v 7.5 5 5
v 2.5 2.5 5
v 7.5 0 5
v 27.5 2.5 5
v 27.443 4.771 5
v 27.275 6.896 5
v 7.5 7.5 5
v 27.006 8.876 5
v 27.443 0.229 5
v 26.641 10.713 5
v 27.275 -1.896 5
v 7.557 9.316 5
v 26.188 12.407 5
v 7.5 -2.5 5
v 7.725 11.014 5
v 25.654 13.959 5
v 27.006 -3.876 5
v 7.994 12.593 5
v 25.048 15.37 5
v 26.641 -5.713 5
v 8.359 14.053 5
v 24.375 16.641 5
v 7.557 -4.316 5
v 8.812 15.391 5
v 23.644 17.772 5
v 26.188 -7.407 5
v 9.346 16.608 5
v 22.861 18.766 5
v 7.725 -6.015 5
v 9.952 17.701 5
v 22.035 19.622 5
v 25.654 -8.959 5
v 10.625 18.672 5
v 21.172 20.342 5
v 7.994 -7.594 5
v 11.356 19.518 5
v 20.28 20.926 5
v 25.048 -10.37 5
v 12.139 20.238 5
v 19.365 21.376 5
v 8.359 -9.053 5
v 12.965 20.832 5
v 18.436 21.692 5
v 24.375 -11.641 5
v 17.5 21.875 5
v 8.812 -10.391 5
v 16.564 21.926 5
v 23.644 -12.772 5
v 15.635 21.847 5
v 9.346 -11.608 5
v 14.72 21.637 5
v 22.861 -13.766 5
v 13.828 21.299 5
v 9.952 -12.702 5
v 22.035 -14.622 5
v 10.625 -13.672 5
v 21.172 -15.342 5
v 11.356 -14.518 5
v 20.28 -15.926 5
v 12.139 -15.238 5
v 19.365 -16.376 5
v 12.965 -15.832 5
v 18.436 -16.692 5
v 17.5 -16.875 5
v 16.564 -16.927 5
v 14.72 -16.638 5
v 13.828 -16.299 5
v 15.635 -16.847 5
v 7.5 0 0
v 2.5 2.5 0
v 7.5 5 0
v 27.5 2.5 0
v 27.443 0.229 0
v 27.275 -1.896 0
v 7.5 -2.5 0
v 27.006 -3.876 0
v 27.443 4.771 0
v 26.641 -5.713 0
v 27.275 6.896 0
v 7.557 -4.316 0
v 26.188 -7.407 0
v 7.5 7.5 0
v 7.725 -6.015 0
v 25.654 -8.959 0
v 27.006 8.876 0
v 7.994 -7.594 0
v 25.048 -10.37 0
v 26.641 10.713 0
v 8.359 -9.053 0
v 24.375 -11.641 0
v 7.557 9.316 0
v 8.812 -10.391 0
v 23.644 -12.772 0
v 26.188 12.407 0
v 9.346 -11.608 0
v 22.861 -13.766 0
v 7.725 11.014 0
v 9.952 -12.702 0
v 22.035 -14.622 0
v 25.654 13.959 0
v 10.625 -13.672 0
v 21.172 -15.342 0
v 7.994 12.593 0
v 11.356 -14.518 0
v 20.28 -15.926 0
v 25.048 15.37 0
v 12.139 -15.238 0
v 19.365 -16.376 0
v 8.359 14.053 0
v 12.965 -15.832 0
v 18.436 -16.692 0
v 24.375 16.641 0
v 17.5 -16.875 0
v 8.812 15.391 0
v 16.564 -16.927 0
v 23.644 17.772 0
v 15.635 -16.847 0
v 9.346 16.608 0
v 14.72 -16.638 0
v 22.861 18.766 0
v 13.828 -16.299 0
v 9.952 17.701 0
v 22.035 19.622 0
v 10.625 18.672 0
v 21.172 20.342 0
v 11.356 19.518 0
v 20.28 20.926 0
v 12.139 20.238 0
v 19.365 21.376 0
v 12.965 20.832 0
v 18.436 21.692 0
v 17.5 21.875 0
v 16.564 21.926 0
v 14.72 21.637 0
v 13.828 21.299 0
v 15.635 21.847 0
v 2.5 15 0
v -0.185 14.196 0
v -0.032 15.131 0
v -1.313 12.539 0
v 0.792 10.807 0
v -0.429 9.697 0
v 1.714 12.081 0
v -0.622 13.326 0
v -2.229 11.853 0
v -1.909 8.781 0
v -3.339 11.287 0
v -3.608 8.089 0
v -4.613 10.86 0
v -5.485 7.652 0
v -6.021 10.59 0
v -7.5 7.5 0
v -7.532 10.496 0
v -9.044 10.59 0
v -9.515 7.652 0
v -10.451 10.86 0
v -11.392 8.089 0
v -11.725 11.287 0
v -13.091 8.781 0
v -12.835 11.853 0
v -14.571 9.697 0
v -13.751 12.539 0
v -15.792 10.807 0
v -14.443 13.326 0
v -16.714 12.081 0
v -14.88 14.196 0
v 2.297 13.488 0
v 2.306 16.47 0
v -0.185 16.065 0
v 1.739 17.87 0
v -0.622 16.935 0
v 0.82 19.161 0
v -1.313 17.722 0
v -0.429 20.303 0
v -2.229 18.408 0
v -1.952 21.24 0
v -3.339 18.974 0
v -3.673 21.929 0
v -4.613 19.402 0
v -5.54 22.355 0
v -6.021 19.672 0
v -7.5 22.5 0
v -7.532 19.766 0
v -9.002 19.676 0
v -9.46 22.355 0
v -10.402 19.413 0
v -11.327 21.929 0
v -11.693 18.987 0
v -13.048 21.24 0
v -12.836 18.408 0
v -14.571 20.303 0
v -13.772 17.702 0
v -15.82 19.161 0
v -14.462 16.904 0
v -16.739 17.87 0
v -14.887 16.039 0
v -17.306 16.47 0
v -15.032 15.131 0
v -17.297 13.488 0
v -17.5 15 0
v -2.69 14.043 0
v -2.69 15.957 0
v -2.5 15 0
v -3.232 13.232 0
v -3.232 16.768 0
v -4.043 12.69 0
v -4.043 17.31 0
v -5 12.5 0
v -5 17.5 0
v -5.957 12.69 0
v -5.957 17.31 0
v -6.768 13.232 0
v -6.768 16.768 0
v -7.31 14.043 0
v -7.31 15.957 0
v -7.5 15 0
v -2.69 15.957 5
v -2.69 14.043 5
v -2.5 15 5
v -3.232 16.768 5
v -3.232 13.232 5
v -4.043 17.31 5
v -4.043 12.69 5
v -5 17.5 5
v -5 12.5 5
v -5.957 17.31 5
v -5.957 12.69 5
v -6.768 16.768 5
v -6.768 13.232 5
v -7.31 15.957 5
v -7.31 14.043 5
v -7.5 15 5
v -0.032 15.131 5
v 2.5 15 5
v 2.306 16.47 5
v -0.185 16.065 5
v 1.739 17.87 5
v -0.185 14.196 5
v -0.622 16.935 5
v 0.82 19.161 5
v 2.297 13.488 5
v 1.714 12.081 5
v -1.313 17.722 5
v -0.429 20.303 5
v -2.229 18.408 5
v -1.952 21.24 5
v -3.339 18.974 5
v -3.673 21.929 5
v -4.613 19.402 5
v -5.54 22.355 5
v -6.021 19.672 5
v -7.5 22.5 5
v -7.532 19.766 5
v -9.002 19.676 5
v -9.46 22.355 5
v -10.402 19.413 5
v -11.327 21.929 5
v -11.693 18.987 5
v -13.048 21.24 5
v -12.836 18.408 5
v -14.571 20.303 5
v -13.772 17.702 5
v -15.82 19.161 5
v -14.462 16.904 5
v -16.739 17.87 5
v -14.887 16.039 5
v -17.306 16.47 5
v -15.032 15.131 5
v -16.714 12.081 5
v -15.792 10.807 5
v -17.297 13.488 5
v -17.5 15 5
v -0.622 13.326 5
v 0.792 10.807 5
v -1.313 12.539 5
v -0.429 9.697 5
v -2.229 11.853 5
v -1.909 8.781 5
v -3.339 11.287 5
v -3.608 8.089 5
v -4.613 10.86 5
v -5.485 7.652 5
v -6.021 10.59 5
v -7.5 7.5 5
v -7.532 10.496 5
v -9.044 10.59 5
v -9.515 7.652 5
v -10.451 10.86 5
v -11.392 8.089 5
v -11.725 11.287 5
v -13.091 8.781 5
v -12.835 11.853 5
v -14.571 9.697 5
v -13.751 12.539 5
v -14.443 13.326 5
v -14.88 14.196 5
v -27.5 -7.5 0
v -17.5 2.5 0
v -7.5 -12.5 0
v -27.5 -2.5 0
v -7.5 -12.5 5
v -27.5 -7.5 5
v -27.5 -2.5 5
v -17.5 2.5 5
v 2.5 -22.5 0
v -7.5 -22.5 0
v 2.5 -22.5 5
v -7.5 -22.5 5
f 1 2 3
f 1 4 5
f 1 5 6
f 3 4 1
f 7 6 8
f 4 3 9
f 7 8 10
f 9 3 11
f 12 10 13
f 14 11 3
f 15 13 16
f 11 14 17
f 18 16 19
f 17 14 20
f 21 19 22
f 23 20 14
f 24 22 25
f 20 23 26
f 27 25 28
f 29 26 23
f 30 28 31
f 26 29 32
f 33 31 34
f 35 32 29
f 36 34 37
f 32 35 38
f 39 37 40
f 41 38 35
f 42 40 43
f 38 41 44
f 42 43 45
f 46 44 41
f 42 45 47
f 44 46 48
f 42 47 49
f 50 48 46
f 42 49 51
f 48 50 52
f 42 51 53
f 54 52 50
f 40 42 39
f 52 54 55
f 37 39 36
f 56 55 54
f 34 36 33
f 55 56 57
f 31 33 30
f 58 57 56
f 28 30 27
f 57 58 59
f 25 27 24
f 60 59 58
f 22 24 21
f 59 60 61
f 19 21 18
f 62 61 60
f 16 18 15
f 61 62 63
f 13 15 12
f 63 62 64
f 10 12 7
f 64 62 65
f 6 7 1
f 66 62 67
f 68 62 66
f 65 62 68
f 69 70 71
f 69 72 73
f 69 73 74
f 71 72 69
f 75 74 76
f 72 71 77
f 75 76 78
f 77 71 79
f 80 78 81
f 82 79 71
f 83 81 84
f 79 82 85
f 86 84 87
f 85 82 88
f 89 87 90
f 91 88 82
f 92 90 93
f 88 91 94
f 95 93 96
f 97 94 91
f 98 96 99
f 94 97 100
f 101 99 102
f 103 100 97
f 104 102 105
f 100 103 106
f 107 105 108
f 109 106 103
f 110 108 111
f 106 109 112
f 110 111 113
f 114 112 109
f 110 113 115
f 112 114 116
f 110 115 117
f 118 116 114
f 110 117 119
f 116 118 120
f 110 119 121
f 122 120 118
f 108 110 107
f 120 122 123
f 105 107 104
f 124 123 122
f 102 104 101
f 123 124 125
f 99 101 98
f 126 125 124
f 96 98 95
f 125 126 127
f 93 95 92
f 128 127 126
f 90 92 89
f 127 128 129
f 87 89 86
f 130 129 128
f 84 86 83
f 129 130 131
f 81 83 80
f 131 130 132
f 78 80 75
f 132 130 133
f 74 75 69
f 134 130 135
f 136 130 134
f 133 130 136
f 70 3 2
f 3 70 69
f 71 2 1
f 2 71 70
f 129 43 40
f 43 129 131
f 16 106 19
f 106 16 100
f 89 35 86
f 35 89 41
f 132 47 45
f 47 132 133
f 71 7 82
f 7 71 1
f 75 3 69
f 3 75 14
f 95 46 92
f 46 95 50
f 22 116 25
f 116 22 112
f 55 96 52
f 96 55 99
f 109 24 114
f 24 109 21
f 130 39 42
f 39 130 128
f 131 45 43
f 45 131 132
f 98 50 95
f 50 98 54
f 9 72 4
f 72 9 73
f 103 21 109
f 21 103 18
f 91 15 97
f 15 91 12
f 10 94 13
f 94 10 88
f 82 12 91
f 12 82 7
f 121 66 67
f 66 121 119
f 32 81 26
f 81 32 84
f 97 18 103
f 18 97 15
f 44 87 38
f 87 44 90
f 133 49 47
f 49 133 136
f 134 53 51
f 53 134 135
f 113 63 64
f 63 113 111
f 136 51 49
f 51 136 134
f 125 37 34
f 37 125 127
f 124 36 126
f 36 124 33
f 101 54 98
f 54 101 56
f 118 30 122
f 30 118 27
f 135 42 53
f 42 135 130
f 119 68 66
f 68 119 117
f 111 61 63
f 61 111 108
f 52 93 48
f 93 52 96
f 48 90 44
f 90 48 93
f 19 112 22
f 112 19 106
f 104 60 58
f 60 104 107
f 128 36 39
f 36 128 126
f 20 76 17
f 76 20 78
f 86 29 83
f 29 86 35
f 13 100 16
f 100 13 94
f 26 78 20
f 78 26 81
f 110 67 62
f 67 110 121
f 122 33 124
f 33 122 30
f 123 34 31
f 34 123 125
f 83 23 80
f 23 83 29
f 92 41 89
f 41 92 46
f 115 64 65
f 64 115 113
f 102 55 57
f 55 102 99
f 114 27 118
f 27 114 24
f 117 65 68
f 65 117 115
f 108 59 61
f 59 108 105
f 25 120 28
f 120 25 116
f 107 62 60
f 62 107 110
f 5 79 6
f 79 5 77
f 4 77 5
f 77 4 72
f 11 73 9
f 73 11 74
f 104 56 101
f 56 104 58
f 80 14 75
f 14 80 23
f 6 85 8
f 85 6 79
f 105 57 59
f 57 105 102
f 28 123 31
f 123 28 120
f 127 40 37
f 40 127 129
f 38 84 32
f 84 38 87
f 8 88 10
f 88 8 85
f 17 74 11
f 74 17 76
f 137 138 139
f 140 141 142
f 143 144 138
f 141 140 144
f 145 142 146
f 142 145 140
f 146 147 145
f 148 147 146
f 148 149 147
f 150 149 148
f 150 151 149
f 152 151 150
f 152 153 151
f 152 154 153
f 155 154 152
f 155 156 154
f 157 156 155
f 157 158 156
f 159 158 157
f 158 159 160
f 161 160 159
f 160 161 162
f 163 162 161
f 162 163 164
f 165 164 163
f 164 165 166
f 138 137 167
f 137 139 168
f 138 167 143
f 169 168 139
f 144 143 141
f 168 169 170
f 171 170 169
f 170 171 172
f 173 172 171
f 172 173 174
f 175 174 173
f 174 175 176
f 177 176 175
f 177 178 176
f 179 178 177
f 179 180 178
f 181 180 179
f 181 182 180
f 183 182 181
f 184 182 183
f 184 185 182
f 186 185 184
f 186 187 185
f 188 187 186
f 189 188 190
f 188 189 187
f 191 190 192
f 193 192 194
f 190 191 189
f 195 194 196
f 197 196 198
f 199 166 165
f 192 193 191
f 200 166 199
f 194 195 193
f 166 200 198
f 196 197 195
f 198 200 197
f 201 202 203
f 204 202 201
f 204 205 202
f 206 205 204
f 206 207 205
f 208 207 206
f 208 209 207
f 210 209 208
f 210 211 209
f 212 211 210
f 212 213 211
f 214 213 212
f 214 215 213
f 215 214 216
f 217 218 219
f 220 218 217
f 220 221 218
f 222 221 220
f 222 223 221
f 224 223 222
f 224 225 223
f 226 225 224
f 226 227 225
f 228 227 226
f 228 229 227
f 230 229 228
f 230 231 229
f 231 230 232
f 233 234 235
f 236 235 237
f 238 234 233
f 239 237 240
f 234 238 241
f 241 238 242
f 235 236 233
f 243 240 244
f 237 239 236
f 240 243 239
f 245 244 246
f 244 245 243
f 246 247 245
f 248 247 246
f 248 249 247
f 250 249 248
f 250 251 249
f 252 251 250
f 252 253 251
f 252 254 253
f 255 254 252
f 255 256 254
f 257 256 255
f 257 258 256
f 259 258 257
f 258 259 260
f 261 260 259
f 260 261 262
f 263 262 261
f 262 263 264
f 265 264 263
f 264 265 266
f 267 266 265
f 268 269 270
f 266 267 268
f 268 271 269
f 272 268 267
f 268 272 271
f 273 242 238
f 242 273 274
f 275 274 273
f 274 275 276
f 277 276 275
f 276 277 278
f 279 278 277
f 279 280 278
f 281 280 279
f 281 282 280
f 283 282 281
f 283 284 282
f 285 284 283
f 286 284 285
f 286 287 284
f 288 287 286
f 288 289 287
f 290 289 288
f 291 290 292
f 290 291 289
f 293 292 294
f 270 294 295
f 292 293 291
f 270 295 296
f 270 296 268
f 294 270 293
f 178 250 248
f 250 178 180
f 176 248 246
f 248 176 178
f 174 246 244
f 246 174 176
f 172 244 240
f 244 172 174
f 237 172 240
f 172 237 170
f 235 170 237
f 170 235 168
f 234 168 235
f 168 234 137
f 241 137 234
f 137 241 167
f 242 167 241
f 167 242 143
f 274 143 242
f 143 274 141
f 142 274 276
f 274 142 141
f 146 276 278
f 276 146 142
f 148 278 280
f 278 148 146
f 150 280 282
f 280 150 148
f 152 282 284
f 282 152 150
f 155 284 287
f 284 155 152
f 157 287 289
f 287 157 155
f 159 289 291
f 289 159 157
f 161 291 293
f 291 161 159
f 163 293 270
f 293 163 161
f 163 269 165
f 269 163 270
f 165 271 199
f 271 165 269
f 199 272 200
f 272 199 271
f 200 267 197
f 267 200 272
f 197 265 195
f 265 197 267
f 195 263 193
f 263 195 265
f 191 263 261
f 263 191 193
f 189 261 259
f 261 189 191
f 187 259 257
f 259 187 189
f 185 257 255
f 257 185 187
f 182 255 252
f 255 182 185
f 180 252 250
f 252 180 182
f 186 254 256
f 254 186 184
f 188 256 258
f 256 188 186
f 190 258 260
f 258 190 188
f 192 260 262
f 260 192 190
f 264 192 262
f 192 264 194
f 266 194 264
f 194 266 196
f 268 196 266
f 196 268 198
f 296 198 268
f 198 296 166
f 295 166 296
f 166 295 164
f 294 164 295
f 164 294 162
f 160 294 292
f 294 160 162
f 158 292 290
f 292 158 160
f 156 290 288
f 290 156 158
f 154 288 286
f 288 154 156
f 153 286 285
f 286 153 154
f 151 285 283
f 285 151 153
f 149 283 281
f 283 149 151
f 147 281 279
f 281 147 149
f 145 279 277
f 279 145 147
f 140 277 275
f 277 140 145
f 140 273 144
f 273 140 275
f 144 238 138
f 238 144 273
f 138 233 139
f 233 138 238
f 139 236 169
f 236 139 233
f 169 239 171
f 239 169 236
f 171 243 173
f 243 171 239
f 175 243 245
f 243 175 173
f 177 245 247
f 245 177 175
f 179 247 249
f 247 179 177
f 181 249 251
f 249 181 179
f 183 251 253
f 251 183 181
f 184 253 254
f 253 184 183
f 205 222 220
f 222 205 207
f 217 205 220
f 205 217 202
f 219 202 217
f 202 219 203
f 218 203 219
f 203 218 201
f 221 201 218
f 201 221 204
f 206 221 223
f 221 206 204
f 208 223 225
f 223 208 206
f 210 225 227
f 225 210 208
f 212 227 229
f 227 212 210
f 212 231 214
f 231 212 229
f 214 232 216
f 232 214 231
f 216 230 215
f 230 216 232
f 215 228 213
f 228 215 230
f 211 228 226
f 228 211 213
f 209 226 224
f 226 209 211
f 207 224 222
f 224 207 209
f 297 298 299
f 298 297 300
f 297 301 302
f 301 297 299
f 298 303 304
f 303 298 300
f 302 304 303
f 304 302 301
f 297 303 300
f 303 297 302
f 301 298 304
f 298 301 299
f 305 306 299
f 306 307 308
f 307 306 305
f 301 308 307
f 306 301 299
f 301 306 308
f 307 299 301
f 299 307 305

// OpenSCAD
// Module names are of the form poly_<inkscape-path-id>().  As a result,
// you can associate a polygon in this OpenSCAD program with the corresponding
// SVG element in the Inkscape document by looking for the XML element with
// the attribute id="inkscape-path-id".

// fudge value is used to ensure that subtracted solids are a tad taller
// in the z dimension than the polygon being subtracted from.  This helps
// keep the resulting .stl file manifold.
fudge = 0.1;
height = 5;
min_line_width = 1.0;
line_fn = 4;


pathelli_0_points = [[-28.346635,-85.039784],[-35.754708,-84.490006],[-42.810523,-82.881847],[-49.315803,-80.276904],[-55.072270,-76.736778],[-59.792139,-72.419244],[-63.265059,-67.540149],[-65.408906,-62.248205],[-66.141558,-56.692121],[-65.373526,-50.979474],[-63.171163,-45.658707],[-59.686445,-40.843800],[-55.071346,-36.648731],[-49.477841,-33.187479],[-43.057904,-30.574024],[-35.963510,-28.922344],[-28.346635,-28.346418],[-20.729757,-28.922342],[-13.635362,-30.574021],[-7.215423,-33.187476],[-1.621916,-36.648728],[2.993184,-40.843798],[6.477903,-45.658706],[8.680267,-50.979473],[9.448299,-56.692121],[8.715647,-62.248206],[6.571799,-67.540151],[3.098878,-72.419246],[-1.620992,-76.736781],[-7.377462,-80.276907],[-13.882743,-82.881849],[-20.938559,-84.490008],[-28.346635,-85.039784],[-28.467725,-74.705793],[-22.754942,-74.349774],[-17.434067,-73.328876],[-12.619084,-71.713551],[-8.423978,-69.574248],[-4.962735,-66.981417],[-2.349337,-64.005509],[-0.697771,-60.716974],[-0.122022,-57.186261],[-0.698322,-53.655851],[-2.350246,-50.367639],[-4.963825,-47.392057],[-8.425094,-44.799535],[-12.620085,-42.660505],[-17.434832,-41.045398],[-22.755367,-40.024646],[-28.467725,-39.668679],[-34.180386,-40.024435],[-39.501247,-41.045050],[-44.316321,-42.660086],[-48.511622,-44.799107],[-51.973166,-47.391673],[-54.586965,-50.367346],[-56.239034,-53.655688],[-56.815387,-57.186261],[-56.265782,-60.620181],[-54.657739,-63.890833],[-52.052857,-66.906302],[-48.512738,-69.574676],[-44.195160,-71.762547],[-39.315985,-73.372402],[-34.023933,-74.366174],[-28.467725,-74.705793],[-28.467725,-74.705793],[-18.897414,-66.141342],[-22.513536,-65.422170],[-25.579139,-63.373847],[-27.627463,-60.308244],[-28.346635,-56.692121],[-27.627463,-53.075998],[-25.579139,-50.010395],[-22.513536,-47.962072],[-18.897414,-47.242900],[-15.281291,-47.962072],[-12.215688,-50.010395],[-10.167364,-53.075998],[-9.448193,-56.692121],[-10.167364,-60.308244],[-12.215688,-63.373847],[-15.281291,-65.422170],[-18.897414,-66.141342],[-18.897414,-66.141342]];
pathelli_0_paths = [[0,1,2,3,4,5,6,7,8,9,10,11,12,13,14,15,16,17,18,19,20,21,22,23,24,25,26,27,28,29,30,31,32],
				[33,34,35,36,37,38,39,40,41,42,43,44,45,46,47,48,49,50,51,52,53,54,55,56,57,58,59,60,61,62,63,64,65,66],
				[67,68,69,70,71,72,73,74,75,76,77,78,79,80,81,82,83,84]];
module poly_pathelli(h, w, res=line_fn)
{
  scale([25.4/96, -25.4/96, 1]) union()
  {
    linear_extrude(height=h)
      polygon(pathelli_0_points, pathelli_0_paths);
  }
}


pathopen_0_points = [[-103.937022,28.346864],[-28.346466,47.244504],[-66.141738,-9.448416],[-103.937022,9.449224]];
module poly_pathopen(h, w, res=line_fn)
{
  scale([25.4/96, -25.4/96, 1]) union()
  {
    linear_extrude(height=h)
      polygon(pathopen_0_points);
  }
}

path4500_0_points = [[-28.346462,47.244504],[-28.346462,85.039784],[9.448822,85.039784]];
module poly_path4500(h, w, res=line_fn)
{
  scale([25.4/96, -25.4/96, 1]) union()
  {
    linear_extrude(height=h)
      polygon(path4500_0_points);
  }
}

pathcombi_0_points = [[47.244102,9.449224],[66.141742,9.449224],[66.141742,-28.346056],[47.244102,-28.346056],[9.448822,-9.448416]];
pathcombi_1_points = [[28.346462,9.449224],[28.563305,16.313806],[29.195379,22.732013],[30.215003,28.700387],[31.594494,34.215467],[33.306170,39.273792],[35.322349,43.871903],[37.615348,48.006338],[40.157487,51.673638],[42.921082,54.870343],[45.878452,57.592992],[49.001915,59.838125],[52.263788,61.602281],[55.636389,62.882001],[59.092036,63.673824],[62.603048,63.974290],[66.141742,63.779939],[69.680436,63.087310],[73.191447,61.892943],[76.647095,60.193378],[80.019696,57.985155],[83.281569,55.264813],[86.405032,52.028892],[89.362402,48.273932],[92.125997,43.996472],[94.668135,39.193053],[96.961135,33.860214],[98.977314,27.994494],[100.688990,21.592434],[102.068481,14.650573],[103.088104,7.165452],[103.720179,-0.866391],[103.937022,-9.448416],[103.720179,-18.030441],[103.088104,-26.062284],[102.068481,-33.547405],[100.688990,-40.489266],[98.977314,-46.891326],[96.961135,-52.757046],[94.668135,-58.089885],[92.125997,-62.893304],[89.362402,-67.170764],[86.405032,-70.925724],[83.281569,-74.161645],[80.019696,-76.881987],[76.647095,-79.090210],[73.191447,-80.789775],[69.680436,-81.984142],[66.141742,-82.676771],[62.603048,-82.871122],[59.092036,-82.570656],[55.636389,-81.778833],[52.263788,-80.499113],[49.001915,-78.734957],[45.878452,-76.489824],[42.921082,-73.767175],[40.157487,-70.570470],[37.615348,-66.903170],[35.322349,-62.768735],[33.306170,-58.170624],[31.594494,-53.112299],[30.215003,-47.597219],[29.195379,-41.628845],[28.563305,-35.210638],[28.346462,-28.346056]];
module poly_pathcombi(h, w, res=line_fn)
{
  scale([25.4/96, -25.4/96, 1]) union()
  {
    linear_extrude(height=h)
      polygon(pathcombi_0_points);
    linear_extrude(height=h)
      polygon(pathcombi_1_points);
  }
}

module inkscape(h)
{
  difference()
  {
    union()
    {
      translate ([0,0,0]) poly_pathelli(h, min(min_line_width, 0.75590551));
      translate ([0,0,0]) poly_pathopen(h, min(min_line_width, 0.365));
      translate ([0,0,0]) poly_path4500(h, min(min_line_width, 0.26499999));
      translate ([0,0,0]) poly_pathcombi(h, min(min_line_width, 0.265));
    }
    union()
    {
    }
  }
}

inkscape(height);
